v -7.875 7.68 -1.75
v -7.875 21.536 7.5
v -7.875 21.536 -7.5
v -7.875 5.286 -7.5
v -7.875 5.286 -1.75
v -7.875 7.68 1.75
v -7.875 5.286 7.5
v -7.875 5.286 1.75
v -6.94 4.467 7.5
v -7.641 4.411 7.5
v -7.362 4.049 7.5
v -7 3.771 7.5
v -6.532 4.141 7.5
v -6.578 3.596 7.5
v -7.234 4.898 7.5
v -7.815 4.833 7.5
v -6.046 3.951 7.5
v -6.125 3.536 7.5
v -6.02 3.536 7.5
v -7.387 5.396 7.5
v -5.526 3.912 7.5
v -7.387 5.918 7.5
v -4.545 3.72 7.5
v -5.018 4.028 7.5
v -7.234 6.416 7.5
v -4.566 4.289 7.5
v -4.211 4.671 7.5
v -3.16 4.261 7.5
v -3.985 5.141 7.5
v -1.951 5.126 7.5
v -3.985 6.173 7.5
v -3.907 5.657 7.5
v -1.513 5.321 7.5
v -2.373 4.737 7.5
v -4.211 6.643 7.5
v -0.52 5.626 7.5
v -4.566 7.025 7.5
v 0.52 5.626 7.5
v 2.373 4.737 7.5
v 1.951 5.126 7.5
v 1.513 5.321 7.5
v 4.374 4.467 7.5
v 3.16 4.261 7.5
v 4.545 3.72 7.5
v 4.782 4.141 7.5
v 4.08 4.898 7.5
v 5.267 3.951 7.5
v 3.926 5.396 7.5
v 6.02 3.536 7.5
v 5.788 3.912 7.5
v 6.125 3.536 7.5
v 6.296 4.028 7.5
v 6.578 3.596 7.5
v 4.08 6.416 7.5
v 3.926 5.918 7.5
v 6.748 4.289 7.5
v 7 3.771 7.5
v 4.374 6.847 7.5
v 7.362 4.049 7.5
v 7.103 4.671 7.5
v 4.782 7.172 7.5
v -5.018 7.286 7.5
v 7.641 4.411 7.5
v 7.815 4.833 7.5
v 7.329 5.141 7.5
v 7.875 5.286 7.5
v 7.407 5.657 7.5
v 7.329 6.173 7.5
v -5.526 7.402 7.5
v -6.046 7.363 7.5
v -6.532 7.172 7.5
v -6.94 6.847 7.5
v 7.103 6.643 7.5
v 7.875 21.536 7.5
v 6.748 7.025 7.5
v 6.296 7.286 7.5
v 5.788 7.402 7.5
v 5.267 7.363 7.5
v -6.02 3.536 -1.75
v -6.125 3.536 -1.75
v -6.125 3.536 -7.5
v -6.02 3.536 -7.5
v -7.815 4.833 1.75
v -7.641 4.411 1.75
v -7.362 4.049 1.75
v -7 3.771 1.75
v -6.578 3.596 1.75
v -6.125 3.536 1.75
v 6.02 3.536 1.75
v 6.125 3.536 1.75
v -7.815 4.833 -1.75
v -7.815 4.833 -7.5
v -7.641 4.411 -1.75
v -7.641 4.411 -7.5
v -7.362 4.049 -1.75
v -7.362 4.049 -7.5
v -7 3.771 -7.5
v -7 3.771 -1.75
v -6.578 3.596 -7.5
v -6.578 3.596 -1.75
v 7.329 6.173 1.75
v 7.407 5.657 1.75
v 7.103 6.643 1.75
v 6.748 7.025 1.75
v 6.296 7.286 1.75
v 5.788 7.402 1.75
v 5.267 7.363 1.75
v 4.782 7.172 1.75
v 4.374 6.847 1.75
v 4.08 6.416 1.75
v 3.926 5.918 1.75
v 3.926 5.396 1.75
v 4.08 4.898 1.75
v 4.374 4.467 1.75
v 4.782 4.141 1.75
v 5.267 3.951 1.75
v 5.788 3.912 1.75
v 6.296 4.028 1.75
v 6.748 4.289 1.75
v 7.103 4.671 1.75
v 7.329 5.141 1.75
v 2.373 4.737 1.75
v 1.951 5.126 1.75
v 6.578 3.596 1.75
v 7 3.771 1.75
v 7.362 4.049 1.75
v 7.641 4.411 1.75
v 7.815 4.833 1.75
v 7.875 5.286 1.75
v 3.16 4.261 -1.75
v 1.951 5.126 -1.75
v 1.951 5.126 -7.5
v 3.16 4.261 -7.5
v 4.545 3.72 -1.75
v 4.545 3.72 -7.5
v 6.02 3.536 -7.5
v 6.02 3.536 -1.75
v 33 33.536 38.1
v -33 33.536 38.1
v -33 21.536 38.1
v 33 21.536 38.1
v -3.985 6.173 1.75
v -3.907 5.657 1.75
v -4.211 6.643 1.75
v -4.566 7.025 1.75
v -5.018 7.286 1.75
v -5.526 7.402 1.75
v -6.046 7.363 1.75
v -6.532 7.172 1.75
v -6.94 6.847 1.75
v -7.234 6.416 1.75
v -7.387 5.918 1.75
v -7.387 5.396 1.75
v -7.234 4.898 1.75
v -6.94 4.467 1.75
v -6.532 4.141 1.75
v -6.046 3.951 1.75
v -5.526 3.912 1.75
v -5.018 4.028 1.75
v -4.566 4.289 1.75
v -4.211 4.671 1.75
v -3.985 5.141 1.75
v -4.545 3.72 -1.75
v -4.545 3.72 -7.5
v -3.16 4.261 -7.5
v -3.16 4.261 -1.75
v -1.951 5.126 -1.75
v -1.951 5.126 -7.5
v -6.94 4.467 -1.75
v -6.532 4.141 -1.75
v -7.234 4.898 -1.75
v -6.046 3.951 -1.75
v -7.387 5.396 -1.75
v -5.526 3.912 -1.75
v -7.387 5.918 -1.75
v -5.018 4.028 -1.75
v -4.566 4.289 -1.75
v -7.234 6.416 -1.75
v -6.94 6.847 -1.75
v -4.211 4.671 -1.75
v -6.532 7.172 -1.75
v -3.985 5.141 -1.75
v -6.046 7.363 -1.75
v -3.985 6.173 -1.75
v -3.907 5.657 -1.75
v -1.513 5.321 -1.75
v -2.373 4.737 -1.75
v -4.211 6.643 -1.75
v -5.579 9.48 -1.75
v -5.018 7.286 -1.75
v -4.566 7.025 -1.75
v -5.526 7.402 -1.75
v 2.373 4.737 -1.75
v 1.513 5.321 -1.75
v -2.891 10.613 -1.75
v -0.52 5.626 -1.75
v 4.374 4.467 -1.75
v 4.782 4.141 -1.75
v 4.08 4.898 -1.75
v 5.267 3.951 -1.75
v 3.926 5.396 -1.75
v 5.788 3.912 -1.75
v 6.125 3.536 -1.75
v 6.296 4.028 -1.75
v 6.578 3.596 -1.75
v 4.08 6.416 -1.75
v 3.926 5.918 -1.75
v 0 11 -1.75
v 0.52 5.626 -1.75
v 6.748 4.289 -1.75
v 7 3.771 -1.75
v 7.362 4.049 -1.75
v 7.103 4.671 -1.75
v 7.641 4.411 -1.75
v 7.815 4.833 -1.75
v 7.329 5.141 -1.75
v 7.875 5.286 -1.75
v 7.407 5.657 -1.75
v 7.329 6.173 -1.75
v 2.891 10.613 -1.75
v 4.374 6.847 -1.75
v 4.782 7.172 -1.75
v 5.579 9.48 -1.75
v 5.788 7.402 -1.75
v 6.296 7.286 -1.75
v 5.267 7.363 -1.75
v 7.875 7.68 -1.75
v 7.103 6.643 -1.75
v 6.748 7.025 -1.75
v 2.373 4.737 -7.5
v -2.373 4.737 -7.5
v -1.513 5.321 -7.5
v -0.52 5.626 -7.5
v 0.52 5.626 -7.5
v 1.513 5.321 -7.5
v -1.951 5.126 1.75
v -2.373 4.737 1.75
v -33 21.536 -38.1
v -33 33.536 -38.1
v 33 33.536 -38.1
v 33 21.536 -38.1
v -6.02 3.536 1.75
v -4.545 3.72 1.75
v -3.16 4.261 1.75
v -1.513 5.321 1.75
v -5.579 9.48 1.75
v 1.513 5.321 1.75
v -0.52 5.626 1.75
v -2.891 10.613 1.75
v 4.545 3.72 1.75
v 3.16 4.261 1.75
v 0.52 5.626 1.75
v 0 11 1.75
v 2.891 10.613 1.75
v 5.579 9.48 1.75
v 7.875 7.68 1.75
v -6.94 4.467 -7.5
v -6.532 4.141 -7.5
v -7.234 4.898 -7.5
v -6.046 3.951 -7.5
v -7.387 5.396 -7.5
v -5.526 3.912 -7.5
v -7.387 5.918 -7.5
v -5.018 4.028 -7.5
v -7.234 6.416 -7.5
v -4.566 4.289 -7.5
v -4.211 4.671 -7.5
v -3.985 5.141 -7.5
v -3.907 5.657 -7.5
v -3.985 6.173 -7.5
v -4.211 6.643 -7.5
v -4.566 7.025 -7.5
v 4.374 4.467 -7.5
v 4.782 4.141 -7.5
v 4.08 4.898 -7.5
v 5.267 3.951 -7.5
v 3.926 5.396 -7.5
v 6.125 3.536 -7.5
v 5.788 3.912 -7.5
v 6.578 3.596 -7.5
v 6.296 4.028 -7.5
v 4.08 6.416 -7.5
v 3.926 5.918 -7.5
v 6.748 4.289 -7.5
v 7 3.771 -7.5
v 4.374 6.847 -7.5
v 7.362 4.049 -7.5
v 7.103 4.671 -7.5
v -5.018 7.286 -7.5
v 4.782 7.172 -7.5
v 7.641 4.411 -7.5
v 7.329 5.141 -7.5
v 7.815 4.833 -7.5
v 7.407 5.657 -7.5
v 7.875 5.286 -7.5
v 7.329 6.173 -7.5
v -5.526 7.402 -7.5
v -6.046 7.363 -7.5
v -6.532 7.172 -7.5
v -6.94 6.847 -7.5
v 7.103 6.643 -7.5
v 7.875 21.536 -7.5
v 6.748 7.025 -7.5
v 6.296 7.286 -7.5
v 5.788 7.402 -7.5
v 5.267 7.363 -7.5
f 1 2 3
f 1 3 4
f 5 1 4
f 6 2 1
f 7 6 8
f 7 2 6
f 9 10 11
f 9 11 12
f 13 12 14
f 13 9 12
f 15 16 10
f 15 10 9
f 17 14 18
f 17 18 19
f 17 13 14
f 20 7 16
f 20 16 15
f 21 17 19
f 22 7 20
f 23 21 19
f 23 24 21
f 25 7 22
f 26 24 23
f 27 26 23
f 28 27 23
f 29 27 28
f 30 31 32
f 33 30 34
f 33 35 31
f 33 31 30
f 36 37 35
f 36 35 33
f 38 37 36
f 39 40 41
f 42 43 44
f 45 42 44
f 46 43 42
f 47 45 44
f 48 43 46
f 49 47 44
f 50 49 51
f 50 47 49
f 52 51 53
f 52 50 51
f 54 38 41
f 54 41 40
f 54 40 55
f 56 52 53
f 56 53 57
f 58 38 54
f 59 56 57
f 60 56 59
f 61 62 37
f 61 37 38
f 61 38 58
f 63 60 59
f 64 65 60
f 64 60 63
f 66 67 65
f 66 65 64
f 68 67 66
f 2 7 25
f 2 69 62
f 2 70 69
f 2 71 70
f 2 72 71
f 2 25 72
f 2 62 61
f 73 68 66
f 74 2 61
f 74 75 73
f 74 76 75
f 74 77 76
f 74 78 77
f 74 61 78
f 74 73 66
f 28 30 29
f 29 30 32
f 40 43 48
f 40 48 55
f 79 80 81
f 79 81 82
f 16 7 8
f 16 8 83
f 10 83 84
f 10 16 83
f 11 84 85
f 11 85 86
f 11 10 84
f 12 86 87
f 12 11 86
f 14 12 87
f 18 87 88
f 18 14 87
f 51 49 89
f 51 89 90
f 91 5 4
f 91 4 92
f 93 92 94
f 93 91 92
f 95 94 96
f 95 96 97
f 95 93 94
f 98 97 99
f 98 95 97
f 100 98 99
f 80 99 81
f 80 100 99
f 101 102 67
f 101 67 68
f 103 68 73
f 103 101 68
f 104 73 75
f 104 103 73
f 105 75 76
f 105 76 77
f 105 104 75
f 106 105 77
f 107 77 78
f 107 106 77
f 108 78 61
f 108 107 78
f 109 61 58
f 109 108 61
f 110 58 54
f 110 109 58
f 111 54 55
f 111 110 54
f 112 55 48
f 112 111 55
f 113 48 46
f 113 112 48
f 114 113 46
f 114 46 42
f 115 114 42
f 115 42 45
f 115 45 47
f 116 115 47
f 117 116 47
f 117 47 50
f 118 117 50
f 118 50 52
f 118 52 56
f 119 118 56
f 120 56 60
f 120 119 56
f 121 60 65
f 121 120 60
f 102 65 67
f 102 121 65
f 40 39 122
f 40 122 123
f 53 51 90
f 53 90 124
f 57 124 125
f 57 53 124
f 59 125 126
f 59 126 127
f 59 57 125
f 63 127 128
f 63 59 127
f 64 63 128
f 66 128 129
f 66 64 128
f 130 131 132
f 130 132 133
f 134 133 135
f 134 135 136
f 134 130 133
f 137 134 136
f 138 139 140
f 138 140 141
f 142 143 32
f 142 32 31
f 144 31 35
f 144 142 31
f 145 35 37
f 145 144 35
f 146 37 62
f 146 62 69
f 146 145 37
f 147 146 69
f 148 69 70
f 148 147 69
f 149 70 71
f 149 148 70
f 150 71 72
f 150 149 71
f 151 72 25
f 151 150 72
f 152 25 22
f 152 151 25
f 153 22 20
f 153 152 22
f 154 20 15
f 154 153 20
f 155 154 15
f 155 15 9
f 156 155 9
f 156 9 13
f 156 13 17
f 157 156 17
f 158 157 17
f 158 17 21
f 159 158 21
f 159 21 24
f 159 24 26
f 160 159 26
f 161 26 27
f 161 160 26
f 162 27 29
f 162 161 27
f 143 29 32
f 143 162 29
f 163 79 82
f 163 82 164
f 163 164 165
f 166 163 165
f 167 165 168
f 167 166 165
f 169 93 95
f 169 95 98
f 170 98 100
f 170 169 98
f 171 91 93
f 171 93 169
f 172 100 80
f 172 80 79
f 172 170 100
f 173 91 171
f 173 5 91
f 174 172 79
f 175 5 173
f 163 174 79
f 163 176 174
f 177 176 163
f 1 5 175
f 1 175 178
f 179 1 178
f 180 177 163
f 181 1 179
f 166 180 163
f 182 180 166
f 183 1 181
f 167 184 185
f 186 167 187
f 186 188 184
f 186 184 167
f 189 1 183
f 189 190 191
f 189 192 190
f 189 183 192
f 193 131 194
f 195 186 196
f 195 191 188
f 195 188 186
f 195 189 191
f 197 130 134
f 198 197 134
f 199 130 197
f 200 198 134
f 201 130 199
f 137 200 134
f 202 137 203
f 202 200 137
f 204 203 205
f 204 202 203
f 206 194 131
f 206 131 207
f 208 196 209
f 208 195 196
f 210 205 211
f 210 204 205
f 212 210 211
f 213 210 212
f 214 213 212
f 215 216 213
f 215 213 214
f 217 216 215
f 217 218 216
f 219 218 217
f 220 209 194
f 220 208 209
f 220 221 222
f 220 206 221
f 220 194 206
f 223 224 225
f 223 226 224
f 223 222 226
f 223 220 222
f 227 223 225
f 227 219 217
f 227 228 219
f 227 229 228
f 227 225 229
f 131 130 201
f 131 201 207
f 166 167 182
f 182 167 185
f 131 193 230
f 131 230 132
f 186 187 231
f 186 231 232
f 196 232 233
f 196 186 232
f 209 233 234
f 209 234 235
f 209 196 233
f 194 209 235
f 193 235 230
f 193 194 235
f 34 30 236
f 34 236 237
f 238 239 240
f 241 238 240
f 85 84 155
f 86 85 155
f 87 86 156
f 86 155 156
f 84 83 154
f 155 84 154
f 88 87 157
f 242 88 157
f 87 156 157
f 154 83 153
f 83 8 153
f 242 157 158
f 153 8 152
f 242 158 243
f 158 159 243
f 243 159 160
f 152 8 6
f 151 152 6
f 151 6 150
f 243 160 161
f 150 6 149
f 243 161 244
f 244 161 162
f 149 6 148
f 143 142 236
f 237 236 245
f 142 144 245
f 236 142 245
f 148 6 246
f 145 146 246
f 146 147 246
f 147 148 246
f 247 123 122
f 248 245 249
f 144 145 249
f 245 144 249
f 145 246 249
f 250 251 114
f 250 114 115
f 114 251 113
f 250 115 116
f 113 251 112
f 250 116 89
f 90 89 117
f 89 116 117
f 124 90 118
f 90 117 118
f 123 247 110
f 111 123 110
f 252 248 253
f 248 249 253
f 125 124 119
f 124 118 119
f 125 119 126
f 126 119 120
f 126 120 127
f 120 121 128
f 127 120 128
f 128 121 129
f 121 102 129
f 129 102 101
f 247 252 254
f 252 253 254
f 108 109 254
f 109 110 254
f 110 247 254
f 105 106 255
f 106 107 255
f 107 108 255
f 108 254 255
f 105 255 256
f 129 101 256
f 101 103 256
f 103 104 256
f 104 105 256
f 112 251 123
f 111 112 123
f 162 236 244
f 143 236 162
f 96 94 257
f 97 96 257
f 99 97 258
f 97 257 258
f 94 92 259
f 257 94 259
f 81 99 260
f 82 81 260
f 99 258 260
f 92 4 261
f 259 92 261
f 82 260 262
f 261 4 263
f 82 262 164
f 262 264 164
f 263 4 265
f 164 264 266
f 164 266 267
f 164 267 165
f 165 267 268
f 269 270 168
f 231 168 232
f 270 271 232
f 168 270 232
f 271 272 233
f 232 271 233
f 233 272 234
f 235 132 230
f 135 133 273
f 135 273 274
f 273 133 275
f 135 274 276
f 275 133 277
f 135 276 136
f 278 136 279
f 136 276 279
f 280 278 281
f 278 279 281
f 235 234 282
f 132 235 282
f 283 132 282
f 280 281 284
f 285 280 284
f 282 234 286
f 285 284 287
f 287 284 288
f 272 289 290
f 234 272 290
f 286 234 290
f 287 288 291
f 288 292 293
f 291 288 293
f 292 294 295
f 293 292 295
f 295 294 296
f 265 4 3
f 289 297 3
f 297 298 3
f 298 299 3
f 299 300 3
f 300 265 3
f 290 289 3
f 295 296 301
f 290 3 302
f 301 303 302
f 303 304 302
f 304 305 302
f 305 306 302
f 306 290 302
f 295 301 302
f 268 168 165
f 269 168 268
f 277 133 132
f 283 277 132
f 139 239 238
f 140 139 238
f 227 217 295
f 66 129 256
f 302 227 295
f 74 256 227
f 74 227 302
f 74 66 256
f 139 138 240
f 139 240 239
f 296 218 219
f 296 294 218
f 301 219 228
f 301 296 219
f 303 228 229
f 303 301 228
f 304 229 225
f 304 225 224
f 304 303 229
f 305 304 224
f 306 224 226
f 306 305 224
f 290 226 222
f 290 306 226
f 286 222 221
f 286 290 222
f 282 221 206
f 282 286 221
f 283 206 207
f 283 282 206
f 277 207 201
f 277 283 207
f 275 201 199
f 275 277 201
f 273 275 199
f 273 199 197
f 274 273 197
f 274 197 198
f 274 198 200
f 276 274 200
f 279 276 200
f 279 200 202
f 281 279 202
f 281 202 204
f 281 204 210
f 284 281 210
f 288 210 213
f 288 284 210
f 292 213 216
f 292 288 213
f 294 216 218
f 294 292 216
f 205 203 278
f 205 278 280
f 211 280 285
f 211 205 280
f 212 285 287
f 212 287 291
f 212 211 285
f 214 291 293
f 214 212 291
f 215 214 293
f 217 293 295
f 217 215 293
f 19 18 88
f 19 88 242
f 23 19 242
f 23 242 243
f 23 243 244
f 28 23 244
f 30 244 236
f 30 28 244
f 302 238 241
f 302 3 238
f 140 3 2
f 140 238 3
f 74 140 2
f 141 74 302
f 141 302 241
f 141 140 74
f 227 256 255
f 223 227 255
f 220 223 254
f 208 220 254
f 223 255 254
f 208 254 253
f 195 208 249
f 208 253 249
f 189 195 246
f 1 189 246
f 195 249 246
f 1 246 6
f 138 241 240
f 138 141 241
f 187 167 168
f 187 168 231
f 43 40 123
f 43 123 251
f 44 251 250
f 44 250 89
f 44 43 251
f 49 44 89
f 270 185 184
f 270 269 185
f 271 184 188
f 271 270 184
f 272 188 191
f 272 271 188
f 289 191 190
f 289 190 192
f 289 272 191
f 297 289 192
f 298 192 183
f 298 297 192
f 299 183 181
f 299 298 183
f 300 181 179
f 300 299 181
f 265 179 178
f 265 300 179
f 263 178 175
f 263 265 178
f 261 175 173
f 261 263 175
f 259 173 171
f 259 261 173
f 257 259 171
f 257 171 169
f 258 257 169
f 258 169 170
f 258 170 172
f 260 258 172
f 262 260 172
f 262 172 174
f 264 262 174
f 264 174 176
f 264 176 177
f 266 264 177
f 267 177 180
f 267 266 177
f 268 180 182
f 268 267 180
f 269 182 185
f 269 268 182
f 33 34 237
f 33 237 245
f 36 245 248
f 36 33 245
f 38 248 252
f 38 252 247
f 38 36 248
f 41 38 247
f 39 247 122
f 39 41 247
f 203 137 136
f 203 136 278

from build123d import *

# Parameters (mm, degrees)
BOSS_EXTRUDE1_DEPTH = 38.1
SKETCH1_4_R         = 1.75
BOSS_EXTRUDE3_DEPTH = 7.5
SKETCH1_5_R         = 1.75
CUT_EXTRUDE1_DEPTH  = 1.75


with BuildPart() as part:
    # Sketch1 → Boss-Extrude1 (new, symmetric)
    with BuildSketch(Plane.XY):
        Polygon((-7.875, 21.53615257), (7.875, 21.53615257), (33, 21.53615257), (33, 33.53615257), (-33, 33.53615257), (-33, 21.53615257), align=None)
    extrude(amount=BOSS_EXTRUDE1_DEPTH, both=True)

    # Sketch1<4> → Boss-Extrude3 (add, symmetric)
    with BuildSketch(Plane.XY):
        with BuildLine():
            ThreePointArc((1.951498019, 5.12615257), (3.835867687, 3.947771767), (6.019900654, 3.53615257))
            Line((6.019900654, 3.53615257), (6.125, 3.53615257))
            ThreePointArc((6.125, 3.53615257), (7.362436867, 4.048715703), (7.875, 5.28615257))
            Line((7.875, 5.28615257), (7.875, 21.53615257))
            Line((7.875, 21.53615257), (-7.875, 21.53615257))
            Line((-7.875, 21.53615257), (-7.875, 5.28615257))
            ThreePointArc((-7.875, 5.28615257), (-7.362436867, 4.048715703), (-6.125, 3.53615257))
            Line((-6.125, 3.53615257), (-6.019900654, 3.53615257))
            ThreePointArc((-6.019900654, 3.53615257), (-3.835867687, 3.947771767), (-1.951498019, 5.12615257))
            Line((-1.951498019, 5.12615257), (-2.37323487, 4.737083337))
            ThreePointArc((-2.37323487, 4.737083337), (0, 5.664583337), (2.37323487, 4.737083337))
            Line((2.37323487, 4.737083337), (1.951498019, 5.12615257))
        make_face()
        with Locations((-5.656854249, 5.656854249)):
            Circle(SKETCH1_4_R, mode=Mode.SUBTRACT)
        with Locations((5.656854249, 5.656854249)):
            Circle(SKETCH1_4_R, mode=Mode.SUBTRACT)
    extrude(amount=BOSS_EXTRUDE3_DEPTH, both=True)

    # Sketch1<5> → Cut-Extrude1 (cut, symmetric)
    with BuildSketch(Plane.XY):
        with BuildLine():
            ThreePointArc((1.951498019, 5.12615257), (3.835867687, 3.947771767), (6.019900654, 3.53615257))
            Line((6.019900654, 3.53615257), (6.125, 3.53615257))
            ThreePointArc((6.125, 3.53615257), (7.362436867, 4.048715703), (7.875, 5.28615257))
            Line((7.875, 5.28615257), (7.875, 7.68012858))
            ThreePointArc((7.875, 7.68012858), (0, 11), (-7.875, 7.68012858))
            Line((-7.875, 7.68012858), (-7.875, 5.28615257))
            ThreePointArc((-7.875, 5.28615257), (-7.362436867, 4.048715703), (-6.125, 3.53615257))
            Line((-6.125, 3.53615257), (-6.019900654, 3.53615257))
            ThreePointArc((-6.019900654, 3.53615257), (-3.835867687, 3.947771767), (-1.951498019, 5.12615257))
            Line((-1.951498019, 5.12615257), (-2.37323487, 4.737083337))
            ThreePointArc((-2.37323487, 4.737083337), (0, 5.664583337), (2.37323487, 4.737083337))
            Line((2.37323487, 4.737083337), (1.951498019, 5.12615257))
        make_face()
        with Locations((-5.656854249, 5.656854249)):
            Circle(SKETCH1_5_R, mode=Mode.SUBTRACT)
        with Locations((5.656854249, 5.656854249)):
            Circle(SKETCH1_5_R, mode=Mode.SUBTRACT)
    extrude(amount=CUT_EXTRUDE1_DEPTH, both=True, mode=Mode.SUBTRACT)


solid = part.part
